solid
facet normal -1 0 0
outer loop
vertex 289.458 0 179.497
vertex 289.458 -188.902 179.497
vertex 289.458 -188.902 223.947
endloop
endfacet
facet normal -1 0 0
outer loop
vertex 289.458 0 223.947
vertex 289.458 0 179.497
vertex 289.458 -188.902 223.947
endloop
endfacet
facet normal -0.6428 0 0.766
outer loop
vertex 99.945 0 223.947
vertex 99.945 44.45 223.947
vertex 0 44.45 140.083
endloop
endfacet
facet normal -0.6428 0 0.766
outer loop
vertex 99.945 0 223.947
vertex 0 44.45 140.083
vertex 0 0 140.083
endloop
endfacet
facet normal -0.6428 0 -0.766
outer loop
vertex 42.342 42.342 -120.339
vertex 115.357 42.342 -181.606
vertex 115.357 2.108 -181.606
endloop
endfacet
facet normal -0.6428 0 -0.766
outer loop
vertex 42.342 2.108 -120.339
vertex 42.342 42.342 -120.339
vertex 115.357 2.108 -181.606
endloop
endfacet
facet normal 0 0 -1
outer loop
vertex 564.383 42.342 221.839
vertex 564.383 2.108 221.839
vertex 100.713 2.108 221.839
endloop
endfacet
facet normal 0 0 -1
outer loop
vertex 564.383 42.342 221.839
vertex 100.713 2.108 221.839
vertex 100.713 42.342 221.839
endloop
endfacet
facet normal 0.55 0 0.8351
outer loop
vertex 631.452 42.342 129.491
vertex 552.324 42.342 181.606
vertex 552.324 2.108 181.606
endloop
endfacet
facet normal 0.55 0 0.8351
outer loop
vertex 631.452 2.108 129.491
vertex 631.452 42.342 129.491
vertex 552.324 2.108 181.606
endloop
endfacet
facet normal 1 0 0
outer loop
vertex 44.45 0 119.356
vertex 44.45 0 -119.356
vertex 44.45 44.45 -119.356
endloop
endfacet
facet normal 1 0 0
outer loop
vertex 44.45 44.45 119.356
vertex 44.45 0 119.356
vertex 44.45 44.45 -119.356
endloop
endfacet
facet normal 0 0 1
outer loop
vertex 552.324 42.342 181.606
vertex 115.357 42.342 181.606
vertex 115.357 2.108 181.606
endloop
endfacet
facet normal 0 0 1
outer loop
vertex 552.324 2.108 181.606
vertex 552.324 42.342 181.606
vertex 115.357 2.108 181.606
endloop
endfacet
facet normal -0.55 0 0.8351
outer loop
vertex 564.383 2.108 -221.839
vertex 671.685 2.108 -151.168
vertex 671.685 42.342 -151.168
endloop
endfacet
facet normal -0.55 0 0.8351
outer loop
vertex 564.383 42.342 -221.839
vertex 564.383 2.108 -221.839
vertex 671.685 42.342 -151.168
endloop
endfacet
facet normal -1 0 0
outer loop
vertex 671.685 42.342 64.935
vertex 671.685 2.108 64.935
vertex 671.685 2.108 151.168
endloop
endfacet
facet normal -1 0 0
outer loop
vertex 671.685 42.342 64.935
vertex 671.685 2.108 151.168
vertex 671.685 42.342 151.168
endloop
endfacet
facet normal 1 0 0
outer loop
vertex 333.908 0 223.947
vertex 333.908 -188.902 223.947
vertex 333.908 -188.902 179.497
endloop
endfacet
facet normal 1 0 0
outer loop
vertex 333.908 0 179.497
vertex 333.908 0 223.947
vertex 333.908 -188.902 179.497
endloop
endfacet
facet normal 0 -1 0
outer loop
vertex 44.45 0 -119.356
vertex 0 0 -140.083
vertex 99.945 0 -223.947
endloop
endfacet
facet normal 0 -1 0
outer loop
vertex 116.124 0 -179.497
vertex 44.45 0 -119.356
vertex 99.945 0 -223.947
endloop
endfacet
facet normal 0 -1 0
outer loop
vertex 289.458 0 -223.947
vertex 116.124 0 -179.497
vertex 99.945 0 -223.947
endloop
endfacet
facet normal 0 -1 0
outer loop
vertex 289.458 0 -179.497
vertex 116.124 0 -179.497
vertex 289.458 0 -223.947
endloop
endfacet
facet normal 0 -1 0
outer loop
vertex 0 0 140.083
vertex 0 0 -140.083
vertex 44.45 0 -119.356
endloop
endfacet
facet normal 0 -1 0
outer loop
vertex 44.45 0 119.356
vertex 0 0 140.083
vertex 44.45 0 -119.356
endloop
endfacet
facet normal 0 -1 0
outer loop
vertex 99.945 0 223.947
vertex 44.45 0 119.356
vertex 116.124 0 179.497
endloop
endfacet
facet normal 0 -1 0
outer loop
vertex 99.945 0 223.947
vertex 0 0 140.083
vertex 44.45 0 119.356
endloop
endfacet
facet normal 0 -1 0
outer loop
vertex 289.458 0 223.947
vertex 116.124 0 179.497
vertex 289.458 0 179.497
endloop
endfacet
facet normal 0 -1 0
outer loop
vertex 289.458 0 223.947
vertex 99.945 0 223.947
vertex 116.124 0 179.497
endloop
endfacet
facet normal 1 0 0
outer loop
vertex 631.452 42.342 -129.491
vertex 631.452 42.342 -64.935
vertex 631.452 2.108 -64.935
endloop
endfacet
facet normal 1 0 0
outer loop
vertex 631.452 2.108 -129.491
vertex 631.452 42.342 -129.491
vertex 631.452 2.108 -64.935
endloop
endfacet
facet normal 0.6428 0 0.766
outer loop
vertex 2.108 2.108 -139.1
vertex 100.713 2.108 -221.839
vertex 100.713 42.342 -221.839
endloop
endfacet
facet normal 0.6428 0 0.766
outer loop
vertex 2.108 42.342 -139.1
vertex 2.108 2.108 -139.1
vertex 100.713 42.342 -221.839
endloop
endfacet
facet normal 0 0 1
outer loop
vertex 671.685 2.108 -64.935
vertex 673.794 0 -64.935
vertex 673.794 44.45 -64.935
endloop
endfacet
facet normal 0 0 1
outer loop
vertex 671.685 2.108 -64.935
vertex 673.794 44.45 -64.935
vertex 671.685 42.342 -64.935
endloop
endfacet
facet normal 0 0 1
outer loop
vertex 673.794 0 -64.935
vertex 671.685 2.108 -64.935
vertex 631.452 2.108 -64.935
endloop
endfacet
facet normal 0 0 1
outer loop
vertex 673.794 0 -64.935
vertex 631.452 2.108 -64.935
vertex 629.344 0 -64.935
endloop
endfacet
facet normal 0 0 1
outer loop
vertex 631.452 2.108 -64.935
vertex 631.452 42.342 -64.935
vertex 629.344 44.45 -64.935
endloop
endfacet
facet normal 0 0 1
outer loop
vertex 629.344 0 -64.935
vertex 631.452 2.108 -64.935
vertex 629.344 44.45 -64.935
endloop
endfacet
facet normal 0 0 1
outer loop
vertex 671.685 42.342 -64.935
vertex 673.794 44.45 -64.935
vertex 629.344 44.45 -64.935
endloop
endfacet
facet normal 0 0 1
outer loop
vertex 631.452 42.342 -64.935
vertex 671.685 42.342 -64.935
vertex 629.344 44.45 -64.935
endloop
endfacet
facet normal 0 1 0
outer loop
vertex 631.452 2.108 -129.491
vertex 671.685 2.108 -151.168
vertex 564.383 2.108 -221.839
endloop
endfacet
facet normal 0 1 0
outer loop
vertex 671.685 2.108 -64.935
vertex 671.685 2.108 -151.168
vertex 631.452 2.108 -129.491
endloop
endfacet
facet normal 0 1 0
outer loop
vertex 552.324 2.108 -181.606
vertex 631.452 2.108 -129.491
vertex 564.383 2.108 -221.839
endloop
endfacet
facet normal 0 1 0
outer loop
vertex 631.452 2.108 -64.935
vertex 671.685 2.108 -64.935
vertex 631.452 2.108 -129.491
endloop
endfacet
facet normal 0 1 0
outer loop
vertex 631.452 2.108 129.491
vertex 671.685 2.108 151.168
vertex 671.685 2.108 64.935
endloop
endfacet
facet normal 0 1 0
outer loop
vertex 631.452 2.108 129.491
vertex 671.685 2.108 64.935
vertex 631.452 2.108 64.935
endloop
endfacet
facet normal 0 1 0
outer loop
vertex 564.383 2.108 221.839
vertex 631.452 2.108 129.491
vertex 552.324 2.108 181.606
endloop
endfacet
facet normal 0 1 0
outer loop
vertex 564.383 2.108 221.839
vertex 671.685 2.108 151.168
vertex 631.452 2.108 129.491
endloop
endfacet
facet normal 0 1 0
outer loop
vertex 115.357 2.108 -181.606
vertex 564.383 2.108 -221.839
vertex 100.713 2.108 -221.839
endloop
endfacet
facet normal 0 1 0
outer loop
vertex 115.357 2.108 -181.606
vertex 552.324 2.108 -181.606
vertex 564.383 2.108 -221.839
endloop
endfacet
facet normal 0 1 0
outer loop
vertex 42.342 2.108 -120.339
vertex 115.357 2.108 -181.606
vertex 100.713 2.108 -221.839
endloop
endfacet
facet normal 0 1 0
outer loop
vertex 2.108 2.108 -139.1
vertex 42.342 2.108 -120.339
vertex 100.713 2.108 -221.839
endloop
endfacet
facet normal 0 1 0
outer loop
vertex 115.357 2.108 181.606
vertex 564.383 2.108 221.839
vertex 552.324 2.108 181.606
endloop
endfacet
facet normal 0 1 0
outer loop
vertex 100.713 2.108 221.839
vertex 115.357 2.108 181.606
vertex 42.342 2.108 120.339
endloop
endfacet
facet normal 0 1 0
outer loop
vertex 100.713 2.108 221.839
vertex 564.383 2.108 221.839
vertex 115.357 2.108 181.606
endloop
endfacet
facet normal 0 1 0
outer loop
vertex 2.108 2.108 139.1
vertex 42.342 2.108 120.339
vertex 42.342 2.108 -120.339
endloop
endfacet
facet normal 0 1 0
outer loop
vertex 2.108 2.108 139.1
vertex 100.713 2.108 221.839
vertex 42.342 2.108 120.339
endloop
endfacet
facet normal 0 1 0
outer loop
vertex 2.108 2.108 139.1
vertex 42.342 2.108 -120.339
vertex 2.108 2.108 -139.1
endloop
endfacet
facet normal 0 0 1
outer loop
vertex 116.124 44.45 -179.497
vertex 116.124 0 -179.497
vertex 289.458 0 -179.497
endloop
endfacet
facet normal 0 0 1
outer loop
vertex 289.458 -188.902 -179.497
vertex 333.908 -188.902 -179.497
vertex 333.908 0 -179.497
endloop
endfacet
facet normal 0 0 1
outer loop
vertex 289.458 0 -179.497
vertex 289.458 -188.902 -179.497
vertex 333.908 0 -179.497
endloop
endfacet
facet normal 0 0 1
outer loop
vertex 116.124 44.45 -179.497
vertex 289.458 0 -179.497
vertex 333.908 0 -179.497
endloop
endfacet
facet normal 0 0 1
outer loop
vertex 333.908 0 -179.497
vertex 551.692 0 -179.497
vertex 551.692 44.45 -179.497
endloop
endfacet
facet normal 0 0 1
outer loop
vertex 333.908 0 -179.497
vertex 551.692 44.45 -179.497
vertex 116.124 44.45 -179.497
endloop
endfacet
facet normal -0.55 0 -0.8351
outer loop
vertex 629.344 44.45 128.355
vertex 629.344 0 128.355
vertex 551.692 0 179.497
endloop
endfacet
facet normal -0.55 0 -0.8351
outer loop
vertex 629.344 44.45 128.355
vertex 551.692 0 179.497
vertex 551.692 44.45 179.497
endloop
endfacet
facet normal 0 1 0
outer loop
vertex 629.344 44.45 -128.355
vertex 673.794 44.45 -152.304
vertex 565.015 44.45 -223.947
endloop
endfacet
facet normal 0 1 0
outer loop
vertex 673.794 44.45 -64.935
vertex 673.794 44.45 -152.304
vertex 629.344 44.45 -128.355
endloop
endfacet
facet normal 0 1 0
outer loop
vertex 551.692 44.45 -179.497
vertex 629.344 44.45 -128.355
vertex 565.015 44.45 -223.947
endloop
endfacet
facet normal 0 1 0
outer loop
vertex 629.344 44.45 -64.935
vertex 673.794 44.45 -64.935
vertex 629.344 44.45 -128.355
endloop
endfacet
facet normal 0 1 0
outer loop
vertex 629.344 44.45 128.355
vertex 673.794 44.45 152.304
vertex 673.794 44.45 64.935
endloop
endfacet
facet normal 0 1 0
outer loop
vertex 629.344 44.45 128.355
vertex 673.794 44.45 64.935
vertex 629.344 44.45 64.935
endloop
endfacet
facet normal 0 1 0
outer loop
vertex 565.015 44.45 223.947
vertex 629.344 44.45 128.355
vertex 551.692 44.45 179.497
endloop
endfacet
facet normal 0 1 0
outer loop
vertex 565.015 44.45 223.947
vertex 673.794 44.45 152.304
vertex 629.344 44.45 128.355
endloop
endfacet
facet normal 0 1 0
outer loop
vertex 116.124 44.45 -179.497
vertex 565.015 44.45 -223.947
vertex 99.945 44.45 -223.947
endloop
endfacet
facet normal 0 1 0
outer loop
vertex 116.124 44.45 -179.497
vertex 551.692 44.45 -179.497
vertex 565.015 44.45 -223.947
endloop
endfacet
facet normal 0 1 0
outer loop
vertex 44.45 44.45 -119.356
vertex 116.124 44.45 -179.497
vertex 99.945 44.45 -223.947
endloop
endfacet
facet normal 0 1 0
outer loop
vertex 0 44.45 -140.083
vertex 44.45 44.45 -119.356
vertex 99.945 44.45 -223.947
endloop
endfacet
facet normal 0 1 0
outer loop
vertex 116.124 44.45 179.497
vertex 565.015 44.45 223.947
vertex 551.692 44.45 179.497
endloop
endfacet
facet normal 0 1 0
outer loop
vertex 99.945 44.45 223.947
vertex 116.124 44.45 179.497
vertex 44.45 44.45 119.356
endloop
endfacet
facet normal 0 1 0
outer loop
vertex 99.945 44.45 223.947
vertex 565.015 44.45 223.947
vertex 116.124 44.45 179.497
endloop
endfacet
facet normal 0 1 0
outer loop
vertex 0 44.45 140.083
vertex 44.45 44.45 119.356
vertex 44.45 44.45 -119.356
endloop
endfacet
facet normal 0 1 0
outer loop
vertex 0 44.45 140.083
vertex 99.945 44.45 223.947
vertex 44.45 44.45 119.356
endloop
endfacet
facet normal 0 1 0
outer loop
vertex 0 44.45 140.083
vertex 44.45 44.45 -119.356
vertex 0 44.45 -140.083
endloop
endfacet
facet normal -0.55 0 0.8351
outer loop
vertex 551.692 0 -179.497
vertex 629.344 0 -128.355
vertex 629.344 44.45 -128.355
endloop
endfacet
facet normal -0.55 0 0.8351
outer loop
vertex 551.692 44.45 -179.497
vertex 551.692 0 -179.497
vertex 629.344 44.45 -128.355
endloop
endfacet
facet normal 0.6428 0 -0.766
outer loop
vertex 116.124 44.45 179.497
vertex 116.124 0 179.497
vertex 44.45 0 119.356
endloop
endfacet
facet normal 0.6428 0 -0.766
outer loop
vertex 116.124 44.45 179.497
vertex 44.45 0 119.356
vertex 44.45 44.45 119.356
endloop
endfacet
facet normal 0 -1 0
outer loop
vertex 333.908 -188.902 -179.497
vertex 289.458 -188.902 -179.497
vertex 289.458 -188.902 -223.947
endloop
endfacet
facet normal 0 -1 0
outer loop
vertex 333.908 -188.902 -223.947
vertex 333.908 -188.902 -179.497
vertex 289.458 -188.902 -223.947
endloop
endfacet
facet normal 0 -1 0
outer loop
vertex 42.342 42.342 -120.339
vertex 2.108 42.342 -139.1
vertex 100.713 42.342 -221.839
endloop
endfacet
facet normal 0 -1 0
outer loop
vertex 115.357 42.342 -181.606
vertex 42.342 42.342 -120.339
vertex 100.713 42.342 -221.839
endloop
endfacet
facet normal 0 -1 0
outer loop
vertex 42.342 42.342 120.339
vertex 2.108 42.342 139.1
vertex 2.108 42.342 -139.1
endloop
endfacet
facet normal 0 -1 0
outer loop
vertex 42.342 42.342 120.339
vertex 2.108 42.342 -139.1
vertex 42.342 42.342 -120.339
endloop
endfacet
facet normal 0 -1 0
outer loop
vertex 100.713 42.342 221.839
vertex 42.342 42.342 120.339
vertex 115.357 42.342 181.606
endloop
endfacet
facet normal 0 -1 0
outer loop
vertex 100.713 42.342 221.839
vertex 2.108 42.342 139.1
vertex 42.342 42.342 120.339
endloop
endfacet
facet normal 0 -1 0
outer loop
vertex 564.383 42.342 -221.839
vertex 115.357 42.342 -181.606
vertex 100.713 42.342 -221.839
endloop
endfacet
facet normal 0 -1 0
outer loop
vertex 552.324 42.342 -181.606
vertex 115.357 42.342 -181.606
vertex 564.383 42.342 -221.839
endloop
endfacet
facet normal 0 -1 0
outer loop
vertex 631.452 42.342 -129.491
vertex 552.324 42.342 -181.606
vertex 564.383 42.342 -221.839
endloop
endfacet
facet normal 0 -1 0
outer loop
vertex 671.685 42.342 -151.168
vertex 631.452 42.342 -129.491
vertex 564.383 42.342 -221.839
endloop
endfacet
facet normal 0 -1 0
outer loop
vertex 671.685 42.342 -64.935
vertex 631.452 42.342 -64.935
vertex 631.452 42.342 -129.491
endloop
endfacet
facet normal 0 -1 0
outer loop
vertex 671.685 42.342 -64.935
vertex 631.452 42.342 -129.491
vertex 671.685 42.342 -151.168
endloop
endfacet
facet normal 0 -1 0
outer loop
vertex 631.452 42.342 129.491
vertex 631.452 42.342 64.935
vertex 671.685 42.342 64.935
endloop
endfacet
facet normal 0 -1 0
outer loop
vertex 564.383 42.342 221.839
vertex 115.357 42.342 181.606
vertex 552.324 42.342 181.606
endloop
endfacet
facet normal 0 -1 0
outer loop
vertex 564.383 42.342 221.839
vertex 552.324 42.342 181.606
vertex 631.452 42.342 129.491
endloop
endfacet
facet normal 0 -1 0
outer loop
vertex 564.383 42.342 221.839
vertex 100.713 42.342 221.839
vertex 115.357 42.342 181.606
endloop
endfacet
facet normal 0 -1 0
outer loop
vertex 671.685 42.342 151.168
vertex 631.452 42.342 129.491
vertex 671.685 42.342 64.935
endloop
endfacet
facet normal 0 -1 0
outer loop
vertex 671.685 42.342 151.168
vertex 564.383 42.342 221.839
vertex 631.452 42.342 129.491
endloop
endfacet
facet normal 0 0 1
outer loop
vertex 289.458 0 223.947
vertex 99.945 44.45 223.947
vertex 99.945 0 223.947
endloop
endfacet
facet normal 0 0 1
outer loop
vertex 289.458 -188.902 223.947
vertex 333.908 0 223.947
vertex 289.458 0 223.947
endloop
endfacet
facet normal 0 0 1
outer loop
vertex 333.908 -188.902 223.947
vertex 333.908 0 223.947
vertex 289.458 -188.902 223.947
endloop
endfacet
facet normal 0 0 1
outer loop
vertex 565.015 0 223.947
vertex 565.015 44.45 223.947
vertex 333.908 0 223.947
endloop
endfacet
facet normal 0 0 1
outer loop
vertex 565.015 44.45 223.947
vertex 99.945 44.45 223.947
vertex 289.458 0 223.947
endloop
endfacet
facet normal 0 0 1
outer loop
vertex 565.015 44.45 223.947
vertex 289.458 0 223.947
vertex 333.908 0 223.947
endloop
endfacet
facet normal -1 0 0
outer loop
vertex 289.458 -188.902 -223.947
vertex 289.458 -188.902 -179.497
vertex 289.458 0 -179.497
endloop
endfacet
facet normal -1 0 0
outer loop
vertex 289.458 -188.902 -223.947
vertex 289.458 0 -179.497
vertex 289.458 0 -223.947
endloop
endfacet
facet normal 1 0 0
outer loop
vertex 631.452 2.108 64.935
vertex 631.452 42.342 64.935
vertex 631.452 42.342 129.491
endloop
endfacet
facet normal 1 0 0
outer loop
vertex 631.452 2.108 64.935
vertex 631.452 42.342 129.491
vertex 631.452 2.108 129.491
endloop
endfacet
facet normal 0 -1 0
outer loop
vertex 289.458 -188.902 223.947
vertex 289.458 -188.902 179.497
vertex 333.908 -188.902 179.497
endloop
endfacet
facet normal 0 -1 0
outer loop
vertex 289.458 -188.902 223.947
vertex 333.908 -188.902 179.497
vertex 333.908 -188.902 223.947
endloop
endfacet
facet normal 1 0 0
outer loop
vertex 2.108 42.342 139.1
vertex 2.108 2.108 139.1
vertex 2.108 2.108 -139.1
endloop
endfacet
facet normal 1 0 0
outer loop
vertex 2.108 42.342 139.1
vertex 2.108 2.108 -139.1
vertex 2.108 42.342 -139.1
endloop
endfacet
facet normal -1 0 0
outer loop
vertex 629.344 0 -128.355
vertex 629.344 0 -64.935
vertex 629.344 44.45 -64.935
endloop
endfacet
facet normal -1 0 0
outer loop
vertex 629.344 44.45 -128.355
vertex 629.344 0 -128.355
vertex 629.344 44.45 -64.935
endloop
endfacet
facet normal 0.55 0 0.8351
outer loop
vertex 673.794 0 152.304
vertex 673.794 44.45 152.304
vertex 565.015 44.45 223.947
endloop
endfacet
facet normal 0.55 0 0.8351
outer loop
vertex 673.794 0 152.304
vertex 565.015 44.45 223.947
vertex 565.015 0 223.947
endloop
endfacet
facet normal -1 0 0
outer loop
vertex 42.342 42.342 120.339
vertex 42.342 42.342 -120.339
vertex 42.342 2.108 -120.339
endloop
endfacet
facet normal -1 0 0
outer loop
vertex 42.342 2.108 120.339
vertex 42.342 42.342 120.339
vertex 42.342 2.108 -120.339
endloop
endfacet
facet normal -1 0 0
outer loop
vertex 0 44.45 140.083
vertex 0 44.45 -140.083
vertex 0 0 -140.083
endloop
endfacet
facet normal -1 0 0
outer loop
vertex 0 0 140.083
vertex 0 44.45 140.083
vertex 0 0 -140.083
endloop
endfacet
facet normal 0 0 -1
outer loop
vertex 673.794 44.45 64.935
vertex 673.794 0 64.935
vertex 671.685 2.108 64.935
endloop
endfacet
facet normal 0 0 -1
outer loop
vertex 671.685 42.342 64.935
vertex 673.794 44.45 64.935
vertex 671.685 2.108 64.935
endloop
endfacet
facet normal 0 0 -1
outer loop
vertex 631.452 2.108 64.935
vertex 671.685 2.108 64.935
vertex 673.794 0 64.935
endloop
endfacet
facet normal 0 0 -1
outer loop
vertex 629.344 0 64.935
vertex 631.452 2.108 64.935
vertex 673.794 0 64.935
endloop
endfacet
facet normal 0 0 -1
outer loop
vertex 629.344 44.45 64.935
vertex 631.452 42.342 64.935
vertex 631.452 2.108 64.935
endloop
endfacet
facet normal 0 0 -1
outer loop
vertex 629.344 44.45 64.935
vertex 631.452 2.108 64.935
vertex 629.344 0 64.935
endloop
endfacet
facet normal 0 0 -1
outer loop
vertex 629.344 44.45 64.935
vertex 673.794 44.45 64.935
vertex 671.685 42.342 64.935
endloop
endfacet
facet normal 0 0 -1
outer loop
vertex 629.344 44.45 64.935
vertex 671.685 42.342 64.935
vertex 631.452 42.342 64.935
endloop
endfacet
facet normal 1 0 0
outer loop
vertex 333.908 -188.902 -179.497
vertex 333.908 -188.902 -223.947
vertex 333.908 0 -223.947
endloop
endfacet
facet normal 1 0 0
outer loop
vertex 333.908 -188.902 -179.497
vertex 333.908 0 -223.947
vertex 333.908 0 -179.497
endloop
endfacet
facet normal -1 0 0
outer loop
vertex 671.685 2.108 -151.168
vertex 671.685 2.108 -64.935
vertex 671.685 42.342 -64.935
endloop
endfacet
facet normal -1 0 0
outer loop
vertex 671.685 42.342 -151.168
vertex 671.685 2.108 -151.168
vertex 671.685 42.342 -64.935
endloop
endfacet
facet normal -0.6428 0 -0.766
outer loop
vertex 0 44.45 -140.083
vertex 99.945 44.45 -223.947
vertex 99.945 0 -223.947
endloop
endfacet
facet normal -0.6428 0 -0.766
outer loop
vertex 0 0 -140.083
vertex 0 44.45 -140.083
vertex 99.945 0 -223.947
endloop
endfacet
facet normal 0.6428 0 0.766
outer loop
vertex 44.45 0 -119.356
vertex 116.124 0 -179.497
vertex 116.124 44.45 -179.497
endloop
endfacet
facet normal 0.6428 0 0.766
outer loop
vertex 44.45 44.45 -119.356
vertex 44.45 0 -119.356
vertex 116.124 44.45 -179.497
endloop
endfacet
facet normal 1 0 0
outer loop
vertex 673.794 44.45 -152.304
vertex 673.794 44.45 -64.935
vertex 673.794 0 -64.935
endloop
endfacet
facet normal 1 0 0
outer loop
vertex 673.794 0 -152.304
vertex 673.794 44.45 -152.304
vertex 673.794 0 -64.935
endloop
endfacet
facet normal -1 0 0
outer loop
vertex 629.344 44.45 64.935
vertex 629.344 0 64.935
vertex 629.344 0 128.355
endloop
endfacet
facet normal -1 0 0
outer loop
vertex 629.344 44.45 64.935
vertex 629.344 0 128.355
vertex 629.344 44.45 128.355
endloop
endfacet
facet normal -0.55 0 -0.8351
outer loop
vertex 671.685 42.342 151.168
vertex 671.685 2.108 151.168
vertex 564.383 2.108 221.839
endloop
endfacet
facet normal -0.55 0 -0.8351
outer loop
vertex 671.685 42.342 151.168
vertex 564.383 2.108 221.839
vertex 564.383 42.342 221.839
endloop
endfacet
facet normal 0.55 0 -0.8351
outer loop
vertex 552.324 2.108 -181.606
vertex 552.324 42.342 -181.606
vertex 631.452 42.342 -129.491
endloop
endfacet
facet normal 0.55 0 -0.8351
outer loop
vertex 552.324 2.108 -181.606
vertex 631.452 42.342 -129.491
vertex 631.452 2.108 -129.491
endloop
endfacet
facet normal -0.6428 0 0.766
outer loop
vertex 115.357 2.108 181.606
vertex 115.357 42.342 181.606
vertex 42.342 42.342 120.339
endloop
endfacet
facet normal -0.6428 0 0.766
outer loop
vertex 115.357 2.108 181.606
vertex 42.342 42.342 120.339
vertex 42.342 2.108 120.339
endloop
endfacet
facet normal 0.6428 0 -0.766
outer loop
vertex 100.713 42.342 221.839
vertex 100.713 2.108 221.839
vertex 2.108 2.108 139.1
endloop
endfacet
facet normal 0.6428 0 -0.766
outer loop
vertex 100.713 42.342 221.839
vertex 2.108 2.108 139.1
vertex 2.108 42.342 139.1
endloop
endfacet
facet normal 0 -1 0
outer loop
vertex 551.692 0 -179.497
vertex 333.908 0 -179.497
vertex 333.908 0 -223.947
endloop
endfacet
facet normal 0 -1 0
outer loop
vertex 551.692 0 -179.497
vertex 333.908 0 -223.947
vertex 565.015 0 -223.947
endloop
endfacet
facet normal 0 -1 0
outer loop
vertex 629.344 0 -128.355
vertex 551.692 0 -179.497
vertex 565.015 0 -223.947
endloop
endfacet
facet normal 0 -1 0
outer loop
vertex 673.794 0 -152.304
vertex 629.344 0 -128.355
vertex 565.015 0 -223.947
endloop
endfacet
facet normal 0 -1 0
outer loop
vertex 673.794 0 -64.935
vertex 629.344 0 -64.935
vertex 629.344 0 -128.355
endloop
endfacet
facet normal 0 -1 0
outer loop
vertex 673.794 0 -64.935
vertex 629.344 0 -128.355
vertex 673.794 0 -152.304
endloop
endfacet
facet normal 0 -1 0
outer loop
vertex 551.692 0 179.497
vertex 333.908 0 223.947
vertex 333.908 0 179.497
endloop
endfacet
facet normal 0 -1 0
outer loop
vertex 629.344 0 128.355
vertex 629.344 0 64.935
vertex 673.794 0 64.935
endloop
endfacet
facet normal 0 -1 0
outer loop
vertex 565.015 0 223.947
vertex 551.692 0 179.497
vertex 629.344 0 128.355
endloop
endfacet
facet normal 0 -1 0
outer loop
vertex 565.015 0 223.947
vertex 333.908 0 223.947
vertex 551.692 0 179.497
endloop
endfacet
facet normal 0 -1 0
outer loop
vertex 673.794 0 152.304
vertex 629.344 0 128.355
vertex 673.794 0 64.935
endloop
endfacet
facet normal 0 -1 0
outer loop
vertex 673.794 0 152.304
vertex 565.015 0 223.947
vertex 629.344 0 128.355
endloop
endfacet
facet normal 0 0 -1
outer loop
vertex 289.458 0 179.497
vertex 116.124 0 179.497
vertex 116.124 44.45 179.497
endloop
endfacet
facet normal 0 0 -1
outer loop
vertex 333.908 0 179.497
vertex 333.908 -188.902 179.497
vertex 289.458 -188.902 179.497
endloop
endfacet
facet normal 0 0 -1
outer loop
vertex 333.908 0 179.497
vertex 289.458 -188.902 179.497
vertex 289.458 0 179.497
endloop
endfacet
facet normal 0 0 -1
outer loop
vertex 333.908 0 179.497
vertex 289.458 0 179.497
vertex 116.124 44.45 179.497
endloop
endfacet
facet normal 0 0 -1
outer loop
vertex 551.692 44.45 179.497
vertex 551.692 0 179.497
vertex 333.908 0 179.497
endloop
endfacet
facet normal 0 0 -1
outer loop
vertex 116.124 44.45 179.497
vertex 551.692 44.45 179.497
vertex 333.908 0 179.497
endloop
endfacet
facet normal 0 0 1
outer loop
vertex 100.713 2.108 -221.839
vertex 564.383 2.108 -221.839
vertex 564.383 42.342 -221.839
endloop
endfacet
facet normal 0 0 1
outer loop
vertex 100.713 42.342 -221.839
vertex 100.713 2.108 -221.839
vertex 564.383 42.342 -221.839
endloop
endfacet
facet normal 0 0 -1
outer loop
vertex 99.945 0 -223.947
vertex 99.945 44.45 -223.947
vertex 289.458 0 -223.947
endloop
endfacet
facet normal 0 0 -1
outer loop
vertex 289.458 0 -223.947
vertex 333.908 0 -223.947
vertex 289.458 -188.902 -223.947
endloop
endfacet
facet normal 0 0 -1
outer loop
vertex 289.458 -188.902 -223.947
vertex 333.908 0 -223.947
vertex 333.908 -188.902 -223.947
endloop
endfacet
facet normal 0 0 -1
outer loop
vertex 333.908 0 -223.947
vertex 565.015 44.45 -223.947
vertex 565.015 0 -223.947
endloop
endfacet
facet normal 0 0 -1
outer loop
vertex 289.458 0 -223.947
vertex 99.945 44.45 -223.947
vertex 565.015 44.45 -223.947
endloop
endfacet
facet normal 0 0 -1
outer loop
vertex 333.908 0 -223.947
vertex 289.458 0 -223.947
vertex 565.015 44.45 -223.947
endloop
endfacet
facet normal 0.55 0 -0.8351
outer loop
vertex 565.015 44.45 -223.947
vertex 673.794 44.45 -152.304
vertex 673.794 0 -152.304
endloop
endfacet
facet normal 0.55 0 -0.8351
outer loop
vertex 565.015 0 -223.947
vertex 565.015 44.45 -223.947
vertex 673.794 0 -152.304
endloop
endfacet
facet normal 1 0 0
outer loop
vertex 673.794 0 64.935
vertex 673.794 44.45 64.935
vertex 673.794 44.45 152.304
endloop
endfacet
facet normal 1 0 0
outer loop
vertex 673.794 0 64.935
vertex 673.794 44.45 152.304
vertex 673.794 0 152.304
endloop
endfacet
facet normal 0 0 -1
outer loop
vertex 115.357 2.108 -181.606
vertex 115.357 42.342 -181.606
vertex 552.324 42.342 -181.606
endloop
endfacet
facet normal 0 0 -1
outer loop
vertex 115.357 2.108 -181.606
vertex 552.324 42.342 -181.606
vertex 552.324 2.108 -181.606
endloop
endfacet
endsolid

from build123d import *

# Parameters (mm, degrees)
F0_W   = 44.45
F0_H   = 44.45
F0_W_2 = 40.2336
F0_H_2 = 40.2336
F4_W   = 44.45
F4_H   = 44.45


with BuildPart() as f2:
    # F2: sweep along a path in F1
    with BuildLine(Plane.XZ) as f2_path:
        Line((-26.4134310049, 0), (-26.4134310049, -152.4))
        Line((-26.4134310049, -152.4), (90.3317421264, -250.3608317162))
        Line((90.3317421264, -250.3608317162), (572.9317421264, -250.3608317162))
        Line((572.9317421264, -250.3608317162), (700.2069564241, -166.5349417689))
        Line((700.2069564241, -166.5349417689), (700.2069564241, -64.9349417689))
    # F0 (on Top) → F2 (sweep)
    with BuildSketch(Plane.XY):
        with Locations((22.225, 22.225)):
            Rectangle(F0_W, F0_H)
        with Locations((22.225, 22.225)):
            Rectangle(F0_W_2, F0_H_2, mode=Mode.SUBTRACT)
    sweep(path=f2_path.line, transition=Transition.RIGHT)

    # F3: F2 across plane


with BuildPart() as f2_1:
    add(f2.part)
    add(f2.part.mirror(Plane.XY))

    # F6: sweep along a path in F5
    with BuildLine(Plane(origin=(0, 0, -223.9474007113), x_dir=(1, 0, 0), z_dir=(0, 0, -1))) as f6_path:
        Line((310.839508958, 21.8996291945), (310.839508958, 210.8011354046))
    # F4 (on face) → F6 (sweep)
    with BuildSketch(Plane.XZ):
        with Locations((311.6830310474, -201.7224007113)):
            Rectangle(F4_W, F4_H)
    sweep(path=f6_path.line)

    # F7: F2 across plane


with BuildPart() as f2_2:
    add(f2_1.part)
    add(f2_1.part.mirror(Plane.XY))


solid = f2_2.part
